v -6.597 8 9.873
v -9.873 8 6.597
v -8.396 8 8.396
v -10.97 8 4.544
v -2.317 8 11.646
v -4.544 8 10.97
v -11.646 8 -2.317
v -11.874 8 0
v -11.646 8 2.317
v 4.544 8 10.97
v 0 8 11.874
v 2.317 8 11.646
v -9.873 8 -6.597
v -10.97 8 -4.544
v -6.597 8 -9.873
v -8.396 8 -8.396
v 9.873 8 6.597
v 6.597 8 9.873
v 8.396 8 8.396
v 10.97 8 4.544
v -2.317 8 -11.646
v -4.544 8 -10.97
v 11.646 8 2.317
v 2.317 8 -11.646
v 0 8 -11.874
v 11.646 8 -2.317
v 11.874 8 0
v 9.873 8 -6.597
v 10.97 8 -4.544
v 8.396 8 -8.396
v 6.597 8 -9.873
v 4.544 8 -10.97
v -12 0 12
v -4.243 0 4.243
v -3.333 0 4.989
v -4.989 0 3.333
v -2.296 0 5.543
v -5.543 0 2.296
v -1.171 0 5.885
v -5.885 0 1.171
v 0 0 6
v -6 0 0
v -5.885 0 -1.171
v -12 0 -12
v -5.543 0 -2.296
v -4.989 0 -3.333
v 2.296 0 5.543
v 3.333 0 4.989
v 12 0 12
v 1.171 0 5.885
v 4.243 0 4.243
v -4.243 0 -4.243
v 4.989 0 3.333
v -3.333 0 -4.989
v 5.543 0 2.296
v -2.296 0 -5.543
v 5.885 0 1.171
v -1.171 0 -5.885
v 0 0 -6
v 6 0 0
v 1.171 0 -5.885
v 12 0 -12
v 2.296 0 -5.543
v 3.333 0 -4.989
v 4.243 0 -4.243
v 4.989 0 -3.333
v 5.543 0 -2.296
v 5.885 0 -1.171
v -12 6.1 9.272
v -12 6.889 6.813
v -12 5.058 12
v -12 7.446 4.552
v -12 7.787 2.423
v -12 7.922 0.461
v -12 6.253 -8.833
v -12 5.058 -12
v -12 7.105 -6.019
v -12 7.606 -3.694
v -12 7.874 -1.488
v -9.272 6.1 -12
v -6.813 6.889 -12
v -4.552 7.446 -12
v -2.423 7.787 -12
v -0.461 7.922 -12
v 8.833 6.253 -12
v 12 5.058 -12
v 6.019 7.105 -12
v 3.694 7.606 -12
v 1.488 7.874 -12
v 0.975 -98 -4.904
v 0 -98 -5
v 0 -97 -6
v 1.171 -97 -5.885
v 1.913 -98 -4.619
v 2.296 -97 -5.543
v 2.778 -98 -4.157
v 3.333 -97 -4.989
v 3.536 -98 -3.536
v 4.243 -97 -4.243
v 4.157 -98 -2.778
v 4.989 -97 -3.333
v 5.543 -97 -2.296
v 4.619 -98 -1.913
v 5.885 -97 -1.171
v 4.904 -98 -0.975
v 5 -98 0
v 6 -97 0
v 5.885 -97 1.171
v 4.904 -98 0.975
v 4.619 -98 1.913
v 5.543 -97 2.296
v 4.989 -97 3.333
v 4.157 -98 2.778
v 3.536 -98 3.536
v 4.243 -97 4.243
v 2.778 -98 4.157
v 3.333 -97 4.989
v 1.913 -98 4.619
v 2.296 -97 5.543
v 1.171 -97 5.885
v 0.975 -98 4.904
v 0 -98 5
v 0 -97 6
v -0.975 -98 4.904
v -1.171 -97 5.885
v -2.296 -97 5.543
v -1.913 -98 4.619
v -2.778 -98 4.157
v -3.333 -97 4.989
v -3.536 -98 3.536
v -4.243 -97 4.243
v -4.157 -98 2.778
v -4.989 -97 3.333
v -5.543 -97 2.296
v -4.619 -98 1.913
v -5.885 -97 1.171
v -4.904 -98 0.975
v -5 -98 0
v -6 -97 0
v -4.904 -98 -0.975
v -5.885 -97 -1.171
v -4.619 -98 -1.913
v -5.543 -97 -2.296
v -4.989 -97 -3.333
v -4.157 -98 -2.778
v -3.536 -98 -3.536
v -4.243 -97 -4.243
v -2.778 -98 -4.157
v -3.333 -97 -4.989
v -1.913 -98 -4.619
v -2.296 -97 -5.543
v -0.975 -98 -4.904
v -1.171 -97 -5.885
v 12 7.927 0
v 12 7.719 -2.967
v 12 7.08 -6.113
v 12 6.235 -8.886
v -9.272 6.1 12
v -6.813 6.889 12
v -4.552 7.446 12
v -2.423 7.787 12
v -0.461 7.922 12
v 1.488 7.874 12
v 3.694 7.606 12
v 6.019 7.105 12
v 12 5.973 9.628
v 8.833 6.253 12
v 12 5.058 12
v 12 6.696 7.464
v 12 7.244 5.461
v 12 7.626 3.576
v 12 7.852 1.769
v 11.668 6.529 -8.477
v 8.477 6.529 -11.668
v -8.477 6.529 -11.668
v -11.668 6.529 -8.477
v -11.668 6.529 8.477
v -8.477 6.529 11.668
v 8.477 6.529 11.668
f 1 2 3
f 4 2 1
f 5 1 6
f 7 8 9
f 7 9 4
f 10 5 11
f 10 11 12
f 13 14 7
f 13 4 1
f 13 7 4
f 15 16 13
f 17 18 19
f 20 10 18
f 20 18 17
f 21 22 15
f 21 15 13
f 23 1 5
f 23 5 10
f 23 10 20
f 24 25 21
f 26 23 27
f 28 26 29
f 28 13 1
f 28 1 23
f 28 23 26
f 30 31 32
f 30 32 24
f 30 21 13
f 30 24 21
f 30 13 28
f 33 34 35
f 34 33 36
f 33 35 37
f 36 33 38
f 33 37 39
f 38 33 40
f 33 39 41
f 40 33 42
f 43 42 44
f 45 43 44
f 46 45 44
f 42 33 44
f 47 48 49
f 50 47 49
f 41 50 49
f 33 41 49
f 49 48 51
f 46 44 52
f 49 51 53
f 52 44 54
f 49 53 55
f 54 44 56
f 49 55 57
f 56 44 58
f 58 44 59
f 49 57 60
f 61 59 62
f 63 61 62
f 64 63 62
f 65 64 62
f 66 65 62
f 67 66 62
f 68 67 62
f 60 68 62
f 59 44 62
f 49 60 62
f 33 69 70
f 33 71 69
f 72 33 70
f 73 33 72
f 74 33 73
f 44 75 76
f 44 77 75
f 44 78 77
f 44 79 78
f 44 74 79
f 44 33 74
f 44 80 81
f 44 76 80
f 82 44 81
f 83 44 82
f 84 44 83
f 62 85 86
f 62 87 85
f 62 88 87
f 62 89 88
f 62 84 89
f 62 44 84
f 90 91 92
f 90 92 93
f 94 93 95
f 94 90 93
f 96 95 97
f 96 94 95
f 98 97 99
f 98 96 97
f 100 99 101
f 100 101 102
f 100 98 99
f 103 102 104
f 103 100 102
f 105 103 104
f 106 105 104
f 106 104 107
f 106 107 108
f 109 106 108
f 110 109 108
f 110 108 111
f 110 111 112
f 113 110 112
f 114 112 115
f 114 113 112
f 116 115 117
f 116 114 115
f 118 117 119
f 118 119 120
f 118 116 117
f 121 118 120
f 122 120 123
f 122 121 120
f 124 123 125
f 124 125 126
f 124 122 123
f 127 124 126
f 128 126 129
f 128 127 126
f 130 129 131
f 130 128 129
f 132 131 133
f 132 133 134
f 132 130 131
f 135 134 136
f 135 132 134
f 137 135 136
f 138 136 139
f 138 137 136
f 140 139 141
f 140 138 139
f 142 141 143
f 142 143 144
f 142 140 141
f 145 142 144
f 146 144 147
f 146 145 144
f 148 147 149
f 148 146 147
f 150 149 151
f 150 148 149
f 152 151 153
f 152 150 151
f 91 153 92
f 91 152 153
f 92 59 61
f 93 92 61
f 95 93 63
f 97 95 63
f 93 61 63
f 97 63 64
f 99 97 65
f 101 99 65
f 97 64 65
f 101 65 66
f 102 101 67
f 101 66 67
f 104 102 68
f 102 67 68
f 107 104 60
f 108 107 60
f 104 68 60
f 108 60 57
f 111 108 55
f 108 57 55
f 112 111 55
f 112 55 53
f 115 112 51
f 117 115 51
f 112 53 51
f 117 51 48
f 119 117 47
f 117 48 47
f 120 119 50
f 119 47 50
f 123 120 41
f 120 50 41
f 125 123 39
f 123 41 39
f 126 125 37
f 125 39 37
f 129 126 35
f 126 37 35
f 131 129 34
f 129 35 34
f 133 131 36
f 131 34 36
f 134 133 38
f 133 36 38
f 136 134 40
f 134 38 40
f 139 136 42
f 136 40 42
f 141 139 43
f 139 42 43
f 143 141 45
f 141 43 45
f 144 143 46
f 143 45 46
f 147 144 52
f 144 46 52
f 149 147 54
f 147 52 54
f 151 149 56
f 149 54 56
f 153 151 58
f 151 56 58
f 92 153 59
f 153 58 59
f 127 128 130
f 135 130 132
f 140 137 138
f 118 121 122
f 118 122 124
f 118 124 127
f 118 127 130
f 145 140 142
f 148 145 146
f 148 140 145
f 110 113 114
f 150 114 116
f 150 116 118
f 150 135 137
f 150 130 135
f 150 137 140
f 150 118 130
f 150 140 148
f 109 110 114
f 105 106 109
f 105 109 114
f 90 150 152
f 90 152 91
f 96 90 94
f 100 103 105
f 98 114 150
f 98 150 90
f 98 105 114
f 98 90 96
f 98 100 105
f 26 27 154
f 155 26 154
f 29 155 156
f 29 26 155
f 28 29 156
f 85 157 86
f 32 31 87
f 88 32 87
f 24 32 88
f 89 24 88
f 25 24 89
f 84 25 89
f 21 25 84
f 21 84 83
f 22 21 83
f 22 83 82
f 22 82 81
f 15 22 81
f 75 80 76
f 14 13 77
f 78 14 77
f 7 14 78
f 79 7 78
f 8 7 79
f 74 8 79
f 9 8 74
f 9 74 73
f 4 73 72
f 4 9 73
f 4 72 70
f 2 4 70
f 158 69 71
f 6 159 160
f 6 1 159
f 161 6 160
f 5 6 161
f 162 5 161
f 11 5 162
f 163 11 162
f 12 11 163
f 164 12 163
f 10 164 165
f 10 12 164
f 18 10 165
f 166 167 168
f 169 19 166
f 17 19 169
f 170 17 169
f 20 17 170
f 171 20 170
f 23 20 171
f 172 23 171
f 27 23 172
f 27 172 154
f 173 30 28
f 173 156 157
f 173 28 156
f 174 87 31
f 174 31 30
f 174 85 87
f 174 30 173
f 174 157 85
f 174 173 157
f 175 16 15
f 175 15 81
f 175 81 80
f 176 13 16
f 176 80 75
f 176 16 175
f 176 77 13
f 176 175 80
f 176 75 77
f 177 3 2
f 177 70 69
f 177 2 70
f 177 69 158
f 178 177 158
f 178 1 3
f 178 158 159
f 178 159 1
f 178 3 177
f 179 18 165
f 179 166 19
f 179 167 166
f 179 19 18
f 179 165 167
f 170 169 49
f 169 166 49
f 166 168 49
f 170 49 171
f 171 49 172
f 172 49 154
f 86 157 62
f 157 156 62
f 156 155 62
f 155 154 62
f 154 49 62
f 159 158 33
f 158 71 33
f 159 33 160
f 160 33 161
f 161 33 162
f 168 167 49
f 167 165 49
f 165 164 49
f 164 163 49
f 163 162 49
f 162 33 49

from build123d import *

# Parameters (mm, degrees)
SKETCH1_W           = 24
SKETCH1_H           = 24
BOSS_EXTRUDE1_DEPTH = 8
SKETCH2_OUTSIDE_W   = 60.688
SKETCH2_OUTSIDE_H   = 60.688
SKETCH2_OUTSIDE_R   = 11.874068454
CUT_EXTRUDE1_DEPTH  = 8
CUT_EXTRUDE1_DRAFT  = -60
SKETCH3_R           = 6
BOSS_EXTRUDE2_DEPTH = 98
CHAMFER1_SIZE       = 1


with BuildPart() as part:
    # Sketch1 → Boss-Extrude1 (new body)
    with BuildSketch(Plane(origin=(0, 0, 0), x_dir=(1, 0, 0), z_dir=(0, 1, 0))):
        Rectangle(SKETCH1_W, SKETCH1_H)
    extrude(amount=BOSS_EXTRUDE1_DEPTH)


with BuildPart() as cut_extrude1_tool:
    # Sketch2 outside → Cut-Extrude1 (with draft: the straight prism first)
    with BuildSketch(Plane(origin=(0, 8, 0), x_dir=(1, 0, 0), z_dir=(0, 1, 0))):
        Rectangle(SKETCH2_OUTSIDE_W, SKETCH2_OUTSIDE_H)
        Circle(SKETCH2_OUTSIDE_R, mode=Mode.SUBTRACT)
    extrude(amount=-CUT_EXTRUDE1_DEPTH)
    # Cut-Extrude1: the draft: its side faces are tilted about the plane it starts from
    cut_extrude1_sides = [cut_extrude1_tool.faces().sort_by_distance(p)[0] for p in [
        (0, 4, 30.344),
        (30.344, 4, 0),
        (0, 4, -30.344),
        (-30.344, 4, 0),
        (-11.874068454, 4, 0),
    ]]
    draft(cut_extrude1_sides, Plane(origin=(0, 8, 0), x_dir=(1, 0, 0), z_dir=(0, 1, 0)), CUT_EXTRUDE1_DRAFT)


with BuildPart() as part_1:
    add(part.part)

    # Cut-Extrude1: cut by cut_extrude1_tool
    add(cut_extrude1_tool.part, mode=Mode.SUBTRACT)

    # Sketch3 → Boss-Extrude2 (add)
    with BuildSketch(Plane.XZ):
        with Locations(Location((0, 0, 0), (0, 0, 270))):
            Circle(SKETCH3_R)
    extrude(amount=BOSS_EXTRUDE2_DEPTH)

    # Chamfer1
    chamfer1_edges = [part_1.edges().sort_by_distance(p)[0] for p in [
        (0, -98, 6),
    ]]
    chamfer(chamfer1_edges, length=CHAMFER1_SIZE)


solid = part_1.part
